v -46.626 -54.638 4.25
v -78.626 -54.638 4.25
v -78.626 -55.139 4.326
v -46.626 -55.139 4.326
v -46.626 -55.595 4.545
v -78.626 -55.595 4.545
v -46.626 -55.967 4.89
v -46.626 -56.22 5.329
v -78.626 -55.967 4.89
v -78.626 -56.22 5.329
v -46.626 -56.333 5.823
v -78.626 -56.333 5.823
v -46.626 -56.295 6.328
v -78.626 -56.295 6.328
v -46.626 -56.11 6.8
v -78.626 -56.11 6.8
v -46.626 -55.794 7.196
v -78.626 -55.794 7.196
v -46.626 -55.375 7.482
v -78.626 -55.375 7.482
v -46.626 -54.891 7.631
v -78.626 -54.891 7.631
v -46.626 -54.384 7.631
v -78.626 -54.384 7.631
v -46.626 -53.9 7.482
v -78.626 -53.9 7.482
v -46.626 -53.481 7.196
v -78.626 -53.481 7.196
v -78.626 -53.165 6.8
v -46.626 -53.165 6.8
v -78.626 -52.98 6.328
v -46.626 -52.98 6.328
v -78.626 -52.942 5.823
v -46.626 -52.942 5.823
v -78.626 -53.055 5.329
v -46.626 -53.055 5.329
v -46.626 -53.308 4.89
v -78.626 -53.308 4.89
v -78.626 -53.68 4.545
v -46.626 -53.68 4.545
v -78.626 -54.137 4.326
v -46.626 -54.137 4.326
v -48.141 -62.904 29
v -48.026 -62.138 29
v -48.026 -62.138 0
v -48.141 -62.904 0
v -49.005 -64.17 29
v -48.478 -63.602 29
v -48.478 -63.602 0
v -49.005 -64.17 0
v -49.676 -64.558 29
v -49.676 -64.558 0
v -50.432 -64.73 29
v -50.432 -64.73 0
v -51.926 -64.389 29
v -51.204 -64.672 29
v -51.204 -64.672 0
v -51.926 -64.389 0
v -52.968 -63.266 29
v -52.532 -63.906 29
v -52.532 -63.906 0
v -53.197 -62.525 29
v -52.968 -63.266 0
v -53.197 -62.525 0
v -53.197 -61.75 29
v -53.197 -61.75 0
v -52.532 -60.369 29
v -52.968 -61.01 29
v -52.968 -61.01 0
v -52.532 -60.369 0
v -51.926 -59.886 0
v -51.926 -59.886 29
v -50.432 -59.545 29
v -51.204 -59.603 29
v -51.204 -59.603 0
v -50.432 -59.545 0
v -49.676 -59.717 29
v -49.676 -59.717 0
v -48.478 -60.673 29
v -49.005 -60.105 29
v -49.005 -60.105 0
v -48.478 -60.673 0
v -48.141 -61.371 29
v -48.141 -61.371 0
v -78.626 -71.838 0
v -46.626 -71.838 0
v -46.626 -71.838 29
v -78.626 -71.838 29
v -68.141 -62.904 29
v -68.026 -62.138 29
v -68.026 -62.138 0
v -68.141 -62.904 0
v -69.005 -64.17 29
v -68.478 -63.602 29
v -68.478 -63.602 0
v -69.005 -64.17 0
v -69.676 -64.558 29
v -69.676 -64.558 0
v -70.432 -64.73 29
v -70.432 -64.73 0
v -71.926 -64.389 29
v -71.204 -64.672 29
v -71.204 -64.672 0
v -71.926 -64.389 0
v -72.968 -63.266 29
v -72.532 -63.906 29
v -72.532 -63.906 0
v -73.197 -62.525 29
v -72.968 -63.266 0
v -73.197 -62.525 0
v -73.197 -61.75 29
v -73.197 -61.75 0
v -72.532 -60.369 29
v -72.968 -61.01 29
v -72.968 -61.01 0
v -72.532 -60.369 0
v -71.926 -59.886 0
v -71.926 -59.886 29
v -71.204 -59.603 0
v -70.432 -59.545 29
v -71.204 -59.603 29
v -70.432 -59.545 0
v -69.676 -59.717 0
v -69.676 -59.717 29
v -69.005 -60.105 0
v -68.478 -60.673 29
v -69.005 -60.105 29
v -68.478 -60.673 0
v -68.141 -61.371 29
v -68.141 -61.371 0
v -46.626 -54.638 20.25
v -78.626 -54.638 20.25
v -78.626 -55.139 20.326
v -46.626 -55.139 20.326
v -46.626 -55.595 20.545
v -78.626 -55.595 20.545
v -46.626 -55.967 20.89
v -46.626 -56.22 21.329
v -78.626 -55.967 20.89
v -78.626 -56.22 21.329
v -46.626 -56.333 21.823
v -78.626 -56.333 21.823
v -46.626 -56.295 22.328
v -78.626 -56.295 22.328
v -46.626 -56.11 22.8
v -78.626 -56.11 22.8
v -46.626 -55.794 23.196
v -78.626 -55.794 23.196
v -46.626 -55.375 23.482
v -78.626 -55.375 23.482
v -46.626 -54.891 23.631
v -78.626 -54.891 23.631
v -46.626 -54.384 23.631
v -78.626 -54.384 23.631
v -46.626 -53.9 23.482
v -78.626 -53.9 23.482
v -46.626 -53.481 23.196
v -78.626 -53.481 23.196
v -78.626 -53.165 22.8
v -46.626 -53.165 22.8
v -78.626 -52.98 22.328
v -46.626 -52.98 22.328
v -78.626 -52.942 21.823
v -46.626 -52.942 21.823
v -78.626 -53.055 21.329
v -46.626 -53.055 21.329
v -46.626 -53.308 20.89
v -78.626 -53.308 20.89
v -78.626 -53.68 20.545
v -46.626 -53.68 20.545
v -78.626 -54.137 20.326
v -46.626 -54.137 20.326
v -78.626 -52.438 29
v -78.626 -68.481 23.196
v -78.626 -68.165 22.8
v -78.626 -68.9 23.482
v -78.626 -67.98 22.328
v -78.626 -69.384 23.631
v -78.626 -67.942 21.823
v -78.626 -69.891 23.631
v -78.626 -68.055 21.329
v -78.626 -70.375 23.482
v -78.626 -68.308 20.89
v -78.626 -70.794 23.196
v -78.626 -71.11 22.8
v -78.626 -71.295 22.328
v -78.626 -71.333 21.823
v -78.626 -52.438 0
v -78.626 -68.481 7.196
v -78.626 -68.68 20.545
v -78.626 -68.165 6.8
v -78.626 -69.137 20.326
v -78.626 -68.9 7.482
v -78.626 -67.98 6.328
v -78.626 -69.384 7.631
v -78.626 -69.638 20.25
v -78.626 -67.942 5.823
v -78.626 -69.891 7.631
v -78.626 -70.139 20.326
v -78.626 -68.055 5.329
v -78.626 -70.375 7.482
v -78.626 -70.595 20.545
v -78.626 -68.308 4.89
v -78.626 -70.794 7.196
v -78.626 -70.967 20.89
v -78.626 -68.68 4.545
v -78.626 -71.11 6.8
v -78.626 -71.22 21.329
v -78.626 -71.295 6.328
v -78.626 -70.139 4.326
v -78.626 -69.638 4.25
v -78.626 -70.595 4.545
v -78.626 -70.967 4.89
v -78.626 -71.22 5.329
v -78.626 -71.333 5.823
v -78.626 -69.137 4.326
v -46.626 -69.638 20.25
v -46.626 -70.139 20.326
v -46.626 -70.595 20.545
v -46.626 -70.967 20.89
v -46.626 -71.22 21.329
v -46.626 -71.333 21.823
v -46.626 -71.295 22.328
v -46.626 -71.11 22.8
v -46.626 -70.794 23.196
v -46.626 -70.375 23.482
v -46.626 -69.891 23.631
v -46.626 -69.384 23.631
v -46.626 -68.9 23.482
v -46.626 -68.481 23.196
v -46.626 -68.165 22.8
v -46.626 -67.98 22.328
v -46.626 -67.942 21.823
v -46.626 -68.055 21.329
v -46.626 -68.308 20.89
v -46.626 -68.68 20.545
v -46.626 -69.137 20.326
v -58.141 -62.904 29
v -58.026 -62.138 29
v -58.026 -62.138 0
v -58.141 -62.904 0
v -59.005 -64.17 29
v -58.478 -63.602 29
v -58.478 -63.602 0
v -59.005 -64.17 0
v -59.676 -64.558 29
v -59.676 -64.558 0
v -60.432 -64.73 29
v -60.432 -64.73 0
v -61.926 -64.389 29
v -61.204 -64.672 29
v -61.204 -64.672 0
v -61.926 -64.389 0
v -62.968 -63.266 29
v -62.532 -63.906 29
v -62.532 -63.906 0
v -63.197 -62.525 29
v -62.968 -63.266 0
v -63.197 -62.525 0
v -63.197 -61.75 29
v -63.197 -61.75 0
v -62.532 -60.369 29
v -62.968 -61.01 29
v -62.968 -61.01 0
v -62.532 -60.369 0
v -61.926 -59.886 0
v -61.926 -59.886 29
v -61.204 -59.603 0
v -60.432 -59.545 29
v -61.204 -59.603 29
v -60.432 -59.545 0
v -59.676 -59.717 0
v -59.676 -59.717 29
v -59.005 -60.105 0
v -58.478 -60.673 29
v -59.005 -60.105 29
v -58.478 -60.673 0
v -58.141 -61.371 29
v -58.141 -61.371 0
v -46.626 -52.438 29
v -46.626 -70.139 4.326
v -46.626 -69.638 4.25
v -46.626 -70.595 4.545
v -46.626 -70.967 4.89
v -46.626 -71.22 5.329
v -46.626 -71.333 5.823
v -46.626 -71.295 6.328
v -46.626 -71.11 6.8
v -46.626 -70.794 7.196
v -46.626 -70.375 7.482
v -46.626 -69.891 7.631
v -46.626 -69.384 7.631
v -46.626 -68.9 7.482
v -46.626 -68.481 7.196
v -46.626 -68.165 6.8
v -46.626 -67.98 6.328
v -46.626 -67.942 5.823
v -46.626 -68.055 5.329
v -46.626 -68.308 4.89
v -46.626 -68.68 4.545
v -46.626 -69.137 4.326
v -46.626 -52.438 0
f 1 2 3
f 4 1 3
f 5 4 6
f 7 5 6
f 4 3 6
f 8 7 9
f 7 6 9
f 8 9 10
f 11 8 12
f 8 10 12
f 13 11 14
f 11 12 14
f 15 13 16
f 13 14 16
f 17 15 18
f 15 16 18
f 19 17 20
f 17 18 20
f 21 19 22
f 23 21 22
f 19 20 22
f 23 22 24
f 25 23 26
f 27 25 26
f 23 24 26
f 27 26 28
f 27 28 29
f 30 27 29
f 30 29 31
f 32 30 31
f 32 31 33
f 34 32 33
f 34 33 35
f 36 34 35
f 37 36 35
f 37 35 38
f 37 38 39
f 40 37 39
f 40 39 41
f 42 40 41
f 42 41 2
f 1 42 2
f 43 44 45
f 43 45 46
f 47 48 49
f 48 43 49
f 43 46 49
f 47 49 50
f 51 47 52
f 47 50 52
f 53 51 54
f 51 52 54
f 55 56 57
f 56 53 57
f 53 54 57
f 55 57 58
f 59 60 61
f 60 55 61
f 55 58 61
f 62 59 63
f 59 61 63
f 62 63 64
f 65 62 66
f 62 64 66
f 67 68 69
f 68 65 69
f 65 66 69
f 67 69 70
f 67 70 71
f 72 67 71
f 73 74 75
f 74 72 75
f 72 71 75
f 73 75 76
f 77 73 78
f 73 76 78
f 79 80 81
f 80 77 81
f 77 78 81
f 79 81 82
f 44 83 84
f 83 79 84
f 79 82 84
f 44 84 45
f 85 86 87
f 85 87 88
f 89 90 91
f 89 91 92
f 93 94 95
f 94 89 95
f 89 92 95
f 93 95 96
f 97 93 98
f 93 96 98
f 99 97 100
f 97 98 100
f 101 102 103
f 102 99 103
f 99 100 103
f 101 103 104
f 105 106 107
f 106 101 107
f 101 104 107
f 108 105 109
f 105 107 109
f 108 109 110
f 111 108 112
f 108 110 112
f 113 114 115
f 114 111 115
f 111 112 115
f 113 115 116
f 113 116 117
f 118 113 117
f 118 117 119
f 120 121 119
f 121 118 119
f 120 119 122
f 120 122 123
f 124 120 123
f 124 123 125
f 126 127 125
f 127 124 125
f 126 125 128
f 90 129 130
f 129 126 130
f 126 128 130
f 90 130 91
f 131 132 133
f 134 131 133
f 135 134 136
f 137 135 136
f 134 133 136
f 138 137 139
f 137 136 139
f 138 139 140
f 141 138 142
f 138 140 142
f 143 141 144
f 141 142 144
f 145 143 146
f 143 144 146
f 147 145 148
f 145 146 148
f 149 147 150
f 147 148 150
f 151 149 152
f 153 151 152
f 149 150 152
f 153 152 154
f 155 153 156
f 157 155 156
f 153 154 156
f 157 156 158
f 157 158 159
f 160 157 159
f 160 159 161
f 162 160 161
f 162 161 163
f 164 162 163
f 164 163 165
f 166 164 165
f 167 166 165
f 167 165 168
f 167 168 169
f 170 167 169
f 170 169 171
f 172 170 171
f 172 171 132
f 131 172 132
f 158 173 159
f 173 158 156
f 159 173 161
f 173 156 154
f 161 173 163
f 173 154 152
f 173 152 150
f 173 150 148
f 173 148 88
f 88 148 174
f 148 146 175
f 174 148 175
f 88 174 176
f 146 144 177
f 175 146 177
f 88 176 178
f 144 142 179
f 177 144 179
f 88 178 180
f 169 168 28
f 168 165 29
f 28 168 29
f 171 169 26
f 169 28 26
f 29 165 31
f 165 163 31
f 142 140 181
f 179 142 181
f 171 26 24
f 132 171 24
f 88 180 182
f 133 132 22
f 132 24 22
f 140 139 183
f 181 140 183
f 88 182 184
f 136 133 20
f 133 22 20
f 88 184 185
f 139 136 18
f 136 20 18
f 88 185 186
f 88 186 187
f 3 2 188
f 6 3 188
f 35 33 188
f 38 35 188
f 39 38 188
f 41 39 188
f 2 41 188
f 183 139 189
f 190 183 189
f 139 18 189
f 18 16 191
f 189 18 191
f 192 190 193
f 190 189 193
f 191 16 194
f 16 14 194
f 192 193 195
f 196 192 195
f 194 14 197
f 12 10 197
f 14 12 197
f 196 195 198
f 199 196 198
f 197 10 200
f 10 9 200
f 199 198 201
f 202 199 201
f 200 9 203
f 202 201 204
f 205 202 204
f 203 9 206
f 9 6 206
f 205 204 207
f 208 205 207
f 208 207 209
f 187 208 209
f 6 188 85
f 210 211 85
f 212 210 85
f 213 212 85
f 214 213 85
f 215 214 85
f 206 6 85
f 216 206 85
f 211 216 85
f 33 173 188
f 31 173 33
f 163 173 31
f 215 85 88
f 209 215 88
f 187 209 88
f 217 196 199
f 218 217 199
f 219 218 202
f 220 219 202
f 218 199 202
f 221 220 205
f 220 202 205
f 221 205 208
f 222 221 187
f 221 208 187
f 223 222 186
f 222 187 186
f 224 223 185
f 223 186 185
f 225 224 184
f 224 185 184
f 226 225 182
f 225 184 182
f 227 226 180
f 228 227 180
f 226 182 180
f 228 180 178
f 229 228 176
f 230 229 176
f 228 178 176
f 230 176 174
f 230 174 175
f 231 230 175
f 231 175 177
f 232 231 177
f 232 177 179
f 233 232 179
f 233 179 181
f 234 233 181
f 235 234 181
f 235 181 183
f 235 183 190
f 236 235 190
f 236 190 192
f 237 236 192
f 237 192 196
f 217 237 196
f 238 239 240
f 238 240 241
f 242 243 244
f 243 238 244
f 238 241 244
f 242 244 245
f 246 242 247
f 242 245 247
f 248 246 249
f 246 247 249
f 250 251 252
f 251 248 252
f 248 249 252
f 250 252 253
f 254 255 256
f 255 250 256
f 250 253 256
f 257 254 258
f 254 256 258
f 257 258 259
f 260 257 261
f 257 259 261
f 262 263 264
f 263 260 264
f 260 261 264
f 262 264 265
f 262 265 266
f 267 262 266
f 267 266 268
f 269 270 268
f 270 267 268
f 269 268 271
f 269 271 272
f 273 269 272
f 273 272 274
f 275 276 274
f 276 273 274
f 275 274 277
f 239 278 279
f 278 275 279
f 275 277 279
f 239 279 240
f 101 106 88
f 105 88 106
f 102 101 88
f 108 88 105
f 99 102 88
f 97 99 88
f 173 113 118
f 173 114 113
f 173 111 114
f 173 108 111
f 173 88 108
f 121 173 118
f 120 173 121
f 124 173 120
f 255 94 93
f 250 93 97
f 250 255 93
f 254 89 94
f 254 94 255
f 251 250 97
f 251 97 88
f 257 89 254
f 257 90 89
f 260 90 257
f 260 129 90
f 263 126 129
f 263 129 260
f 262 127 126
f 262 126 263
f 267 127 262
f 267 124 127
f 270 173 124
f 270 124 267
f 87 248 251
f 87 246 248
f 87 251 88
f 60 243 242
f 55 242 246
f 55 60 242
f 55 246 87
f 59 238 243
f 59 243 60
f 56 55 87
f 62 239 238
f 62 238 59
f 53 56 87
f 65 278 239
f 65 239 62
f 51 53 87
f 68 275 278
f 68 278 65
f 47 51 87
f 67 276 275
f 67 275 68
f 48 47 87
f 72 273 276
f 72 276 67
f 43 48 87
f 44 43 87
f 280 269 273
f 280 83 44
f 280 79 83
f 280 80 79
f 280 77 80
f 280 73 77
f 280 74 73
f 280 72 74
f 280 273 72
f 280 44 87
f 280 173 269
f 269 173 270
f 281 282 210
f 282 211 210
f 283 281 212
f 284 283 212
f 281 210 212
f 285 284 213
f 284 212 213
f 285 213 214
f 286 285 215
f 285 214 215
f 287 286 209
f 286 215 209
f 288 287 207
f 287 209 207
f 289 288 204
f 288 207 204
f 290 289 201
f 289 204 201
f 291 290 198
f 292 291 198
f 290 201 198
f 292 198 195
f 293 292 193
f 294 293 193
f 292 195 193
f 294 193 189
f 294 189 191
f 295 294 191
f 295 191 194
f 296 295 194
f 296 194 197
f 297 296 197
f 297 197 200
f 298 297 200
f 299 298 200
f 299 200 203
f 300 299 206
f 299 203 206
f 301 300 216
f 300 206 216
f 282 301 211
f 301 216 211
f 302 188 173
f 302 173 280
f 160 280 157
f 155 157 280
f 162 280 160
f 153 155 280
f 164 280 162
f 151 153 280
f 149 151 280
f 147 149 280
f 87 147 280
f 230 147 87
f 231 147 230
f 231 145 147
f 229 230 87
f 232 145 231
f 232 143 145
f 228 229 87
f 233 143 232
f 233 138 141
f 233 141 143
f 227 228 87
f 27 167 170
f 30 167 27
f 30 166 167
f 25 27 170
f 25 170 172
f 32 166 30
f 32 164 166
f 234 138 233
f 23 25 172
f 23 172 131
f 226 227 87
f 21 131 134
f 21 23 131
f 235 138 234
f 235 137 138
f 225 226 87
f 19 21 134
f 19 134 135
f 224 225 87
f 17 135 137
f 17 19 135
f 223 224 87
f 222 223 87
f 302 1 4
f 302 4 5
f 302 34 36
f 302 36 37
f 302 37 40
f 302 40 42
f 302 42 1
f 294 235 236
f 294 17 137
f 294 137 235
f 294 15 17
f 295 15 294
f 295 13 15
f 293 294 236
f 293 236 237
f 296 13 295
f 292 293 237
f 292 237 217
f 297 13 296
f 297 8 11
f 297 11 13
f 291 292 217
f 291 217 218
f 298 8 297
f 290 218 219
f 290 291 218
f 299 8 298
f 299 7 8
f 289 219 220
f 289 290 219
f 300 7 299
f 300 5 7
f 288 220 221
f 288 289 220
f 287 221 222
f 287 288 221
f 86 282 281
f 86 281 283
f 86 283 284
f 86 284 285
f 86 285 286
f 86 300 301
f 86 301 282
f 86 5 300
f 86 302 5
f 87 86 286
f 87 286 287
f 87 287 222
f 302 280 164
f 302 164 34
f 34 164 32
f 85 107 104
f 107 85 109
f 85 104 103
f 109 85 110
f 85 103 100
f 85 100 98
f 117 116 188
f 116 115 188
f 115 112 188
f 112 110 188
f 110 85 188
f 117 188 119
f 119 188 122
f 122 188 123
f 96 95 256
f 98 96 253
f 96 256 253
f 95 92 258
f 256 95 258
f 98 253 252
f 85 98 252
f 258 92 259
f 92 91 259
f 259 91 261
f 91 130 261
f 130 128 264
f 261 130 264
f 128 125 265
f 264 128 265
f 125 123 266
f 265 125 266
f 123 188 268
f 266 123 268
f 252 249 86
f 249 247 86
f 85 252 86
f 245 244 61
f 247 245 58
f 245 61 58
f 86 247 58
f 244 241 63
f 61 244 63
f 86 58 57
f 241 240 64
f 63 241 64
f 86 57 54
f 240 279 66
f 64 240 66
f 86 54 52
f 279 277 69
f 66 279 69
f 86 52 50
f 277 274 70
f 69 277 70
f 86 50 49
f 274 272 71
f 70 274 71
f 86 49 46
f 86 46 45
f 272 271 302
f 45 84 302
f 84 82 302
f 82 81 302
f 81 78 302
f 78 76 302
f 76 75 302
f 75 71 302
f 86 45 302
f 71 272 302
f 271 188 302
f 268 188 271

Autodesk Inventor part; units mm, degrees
ref_plane "YZ Plane" through (0, 0, 0) normal (1, 0, 0) x (0, 1, 0)
ref_plane "XZ Plane" through (0, 0, 0) normal (0, 1, 0) x (-1, 0, 0)
ref_plane "XY Plane" through (0, 0, 0) normal (0, 0, 1) x (1, 0, 0)
sketch "Sketch1" plane through (0, 0, 0) normal (0, 0, 1) x (1, 0, 0)
  circle A0 centre (-50.6259, -62.1376) radius 2.067 projected
  circle A1 centre (-60.6259, -62.1376) radius 2.067 projected
  circle A2 centre (-70.6259, -62.1376) radius 2.067 projected
  arc A3 (-51.6259, -32.7366) -> (-51.6259, -28.7366) centre (-51.6259, -30.7366) ccw projected
  line L0 (-51.6259, -32.7366) -> (-61.6259, -32.7366) projected
  arc A4 (-61.6259, -28.7366) -> (-61.6259, -32.7366) centre (-61.6259, -30.7366) ccw projected
  line L1 (-61.6259, -28.7366) -> (-51.6259, -28.7366) projected
  circle A5 centre (-47.1259, -20.7366) radius 1.2295 projected
  circle A6 centre (-66.1259, -20.7366) radius 1.2295 projected
  circle A7 centre (-47.1259, -10.7366) radius 1.2295 projected
  circle A8 centre (-66.1259, -10.7366) radius 1.2295 projected
  circle A9 centre (-33.2634, 4.8443) radius 1.2295 projected
  circle A10 centre (-15.9429, 14.8443) radius 1.2295 projected
  circle A11 centre (1.3776, 24.8443) radius 1.2295 projected
  circle A12 centre (18.6981, 34.8443) radius 1.2295 projected
  circle A13 centre (36.0187, 44.8443) radius 1.2295 projected
  circle A14 centre (53.3392, 54.8443) radius 1.2295 projected
  circle A15 centre (70.6597, 64.8443) radius 1.2295 projected
  line L2 (72.8006, 71.2078) -> (72.645, 71.1179) projected
  arc A16 (72.645, 71.1179) -> (69.1955, 71.4356) centre (70.6956, 68.8376) ccw projected
  line L3 (69.1955, 71.4356) -> (-42.6259, 6.8679) projected
  line L4 (-42.6259, 6.8679) -> (-42.6259, 0.2634) projected
  arc A17 (-48.6259, -5.7366) -> (-42.6259, 0.2634) centre (-48.6259, 0.2634) ccw projected
  line L5 (-48.6259, -5.7366) -> (-67.6259, -5.7366) projected
  arc A18 (-67.6259, -5.7366) -> (-72.6259, -10.7366) centre (-67.6259, -10.7366) ccw projected
  line L6 (-72.6259, -10.7366) -> (-72.6259, -46.4376) projected
  arc A19 (-78.6259, -52.4376) -> (-72.6259, -46.4376) centre (-78.6259, -46.4376) ccw projected
  line L7 (-78.6259, -52.4376) -> (-78.6259, -71.8376) projected
  line L8 (-78.6259, -71.8376) -> (-48.6259, -71.8376) projected
  arc A20 (-48.6259, -71.8376) -> (-23.6259, -46.8376) centre (-48.6259, -46.8376) ccw projected
  arc A21 (16.3839, 22.4655) -> (-23.6259, -46.8376) centre (56.4008, -46.8376) ccw projected
  line L9 (16.3839, 22.4655) -> (77.126, 57.5391) projected
  arc A22 (77.126, 57.5391) -> (78.2359, 61.6161) centre (75.6259, 60.1371) ccw projected
  line L10 (78.2359, 61.6161) -> (72.8006, 71.2078) projected
  line L11 (-78.6259, -52.4376) -> (-46.6259, -52.4376)
  line L12 (-46.6259, -52.4376) -> (-46.6259, -71.8376)
  line L13 (-46.6259, -71.8376) -> (-78.6259, -71.8376)
  line L14 (-78.6259, -71.8376) -> (-78.6259, -52.4376)
  circle A23 centre (-70.6259, -62.1376) radius 2.6
  circle A24 centre (-60.6259, -62.1376) radius 2.6
  circle A25 centre (-50.6259, -62.1376) radius 2.6
  point P0 (0, 0)
  point P1 (-46.6259, -71.7575)
  dimension "d0" = 32
  dimension "d1" = 19.4
  dimension "d2" = 5.2
  dimension "d3" = 5.2
  dimension "d4" = 5.2
extrude "Extrusion1" add sketch "Sketch1" along normal blind 29 contours L12 L13 A20 | A20 L8 L7 L11 L12
sketch "Sketch2" plane through (-46.6259, -71.7575, 0) normal (1, 0, 0) x (0, 0, -1)
  circle A0 centre (-21.95, 17.1199) radius 1.25
  circle A1 centre (-21.95, 2.1199) radius 1.25
  circle A2 centre (-5.95, 2.1199) radius 1.25
  circle A3 centre (-5.95, 17.1199) radius 1.25
  point P0 (0, 71.7575)
hole "Hole1" at (-46.6259, -69.6376, 21.95) at (-46.6259, -69.6376, 5.95) at (-46.6259, -54.6376, 5.95) at (-46.6259, -54.6376, 21.95) direction (-1, 0, 0) diameter 3.4 end through all clearance for "Countersunk Flat Head Screw ISO 2009/7046" size "M3" standard "ISO"
properties part number "connection block mgn9h"
